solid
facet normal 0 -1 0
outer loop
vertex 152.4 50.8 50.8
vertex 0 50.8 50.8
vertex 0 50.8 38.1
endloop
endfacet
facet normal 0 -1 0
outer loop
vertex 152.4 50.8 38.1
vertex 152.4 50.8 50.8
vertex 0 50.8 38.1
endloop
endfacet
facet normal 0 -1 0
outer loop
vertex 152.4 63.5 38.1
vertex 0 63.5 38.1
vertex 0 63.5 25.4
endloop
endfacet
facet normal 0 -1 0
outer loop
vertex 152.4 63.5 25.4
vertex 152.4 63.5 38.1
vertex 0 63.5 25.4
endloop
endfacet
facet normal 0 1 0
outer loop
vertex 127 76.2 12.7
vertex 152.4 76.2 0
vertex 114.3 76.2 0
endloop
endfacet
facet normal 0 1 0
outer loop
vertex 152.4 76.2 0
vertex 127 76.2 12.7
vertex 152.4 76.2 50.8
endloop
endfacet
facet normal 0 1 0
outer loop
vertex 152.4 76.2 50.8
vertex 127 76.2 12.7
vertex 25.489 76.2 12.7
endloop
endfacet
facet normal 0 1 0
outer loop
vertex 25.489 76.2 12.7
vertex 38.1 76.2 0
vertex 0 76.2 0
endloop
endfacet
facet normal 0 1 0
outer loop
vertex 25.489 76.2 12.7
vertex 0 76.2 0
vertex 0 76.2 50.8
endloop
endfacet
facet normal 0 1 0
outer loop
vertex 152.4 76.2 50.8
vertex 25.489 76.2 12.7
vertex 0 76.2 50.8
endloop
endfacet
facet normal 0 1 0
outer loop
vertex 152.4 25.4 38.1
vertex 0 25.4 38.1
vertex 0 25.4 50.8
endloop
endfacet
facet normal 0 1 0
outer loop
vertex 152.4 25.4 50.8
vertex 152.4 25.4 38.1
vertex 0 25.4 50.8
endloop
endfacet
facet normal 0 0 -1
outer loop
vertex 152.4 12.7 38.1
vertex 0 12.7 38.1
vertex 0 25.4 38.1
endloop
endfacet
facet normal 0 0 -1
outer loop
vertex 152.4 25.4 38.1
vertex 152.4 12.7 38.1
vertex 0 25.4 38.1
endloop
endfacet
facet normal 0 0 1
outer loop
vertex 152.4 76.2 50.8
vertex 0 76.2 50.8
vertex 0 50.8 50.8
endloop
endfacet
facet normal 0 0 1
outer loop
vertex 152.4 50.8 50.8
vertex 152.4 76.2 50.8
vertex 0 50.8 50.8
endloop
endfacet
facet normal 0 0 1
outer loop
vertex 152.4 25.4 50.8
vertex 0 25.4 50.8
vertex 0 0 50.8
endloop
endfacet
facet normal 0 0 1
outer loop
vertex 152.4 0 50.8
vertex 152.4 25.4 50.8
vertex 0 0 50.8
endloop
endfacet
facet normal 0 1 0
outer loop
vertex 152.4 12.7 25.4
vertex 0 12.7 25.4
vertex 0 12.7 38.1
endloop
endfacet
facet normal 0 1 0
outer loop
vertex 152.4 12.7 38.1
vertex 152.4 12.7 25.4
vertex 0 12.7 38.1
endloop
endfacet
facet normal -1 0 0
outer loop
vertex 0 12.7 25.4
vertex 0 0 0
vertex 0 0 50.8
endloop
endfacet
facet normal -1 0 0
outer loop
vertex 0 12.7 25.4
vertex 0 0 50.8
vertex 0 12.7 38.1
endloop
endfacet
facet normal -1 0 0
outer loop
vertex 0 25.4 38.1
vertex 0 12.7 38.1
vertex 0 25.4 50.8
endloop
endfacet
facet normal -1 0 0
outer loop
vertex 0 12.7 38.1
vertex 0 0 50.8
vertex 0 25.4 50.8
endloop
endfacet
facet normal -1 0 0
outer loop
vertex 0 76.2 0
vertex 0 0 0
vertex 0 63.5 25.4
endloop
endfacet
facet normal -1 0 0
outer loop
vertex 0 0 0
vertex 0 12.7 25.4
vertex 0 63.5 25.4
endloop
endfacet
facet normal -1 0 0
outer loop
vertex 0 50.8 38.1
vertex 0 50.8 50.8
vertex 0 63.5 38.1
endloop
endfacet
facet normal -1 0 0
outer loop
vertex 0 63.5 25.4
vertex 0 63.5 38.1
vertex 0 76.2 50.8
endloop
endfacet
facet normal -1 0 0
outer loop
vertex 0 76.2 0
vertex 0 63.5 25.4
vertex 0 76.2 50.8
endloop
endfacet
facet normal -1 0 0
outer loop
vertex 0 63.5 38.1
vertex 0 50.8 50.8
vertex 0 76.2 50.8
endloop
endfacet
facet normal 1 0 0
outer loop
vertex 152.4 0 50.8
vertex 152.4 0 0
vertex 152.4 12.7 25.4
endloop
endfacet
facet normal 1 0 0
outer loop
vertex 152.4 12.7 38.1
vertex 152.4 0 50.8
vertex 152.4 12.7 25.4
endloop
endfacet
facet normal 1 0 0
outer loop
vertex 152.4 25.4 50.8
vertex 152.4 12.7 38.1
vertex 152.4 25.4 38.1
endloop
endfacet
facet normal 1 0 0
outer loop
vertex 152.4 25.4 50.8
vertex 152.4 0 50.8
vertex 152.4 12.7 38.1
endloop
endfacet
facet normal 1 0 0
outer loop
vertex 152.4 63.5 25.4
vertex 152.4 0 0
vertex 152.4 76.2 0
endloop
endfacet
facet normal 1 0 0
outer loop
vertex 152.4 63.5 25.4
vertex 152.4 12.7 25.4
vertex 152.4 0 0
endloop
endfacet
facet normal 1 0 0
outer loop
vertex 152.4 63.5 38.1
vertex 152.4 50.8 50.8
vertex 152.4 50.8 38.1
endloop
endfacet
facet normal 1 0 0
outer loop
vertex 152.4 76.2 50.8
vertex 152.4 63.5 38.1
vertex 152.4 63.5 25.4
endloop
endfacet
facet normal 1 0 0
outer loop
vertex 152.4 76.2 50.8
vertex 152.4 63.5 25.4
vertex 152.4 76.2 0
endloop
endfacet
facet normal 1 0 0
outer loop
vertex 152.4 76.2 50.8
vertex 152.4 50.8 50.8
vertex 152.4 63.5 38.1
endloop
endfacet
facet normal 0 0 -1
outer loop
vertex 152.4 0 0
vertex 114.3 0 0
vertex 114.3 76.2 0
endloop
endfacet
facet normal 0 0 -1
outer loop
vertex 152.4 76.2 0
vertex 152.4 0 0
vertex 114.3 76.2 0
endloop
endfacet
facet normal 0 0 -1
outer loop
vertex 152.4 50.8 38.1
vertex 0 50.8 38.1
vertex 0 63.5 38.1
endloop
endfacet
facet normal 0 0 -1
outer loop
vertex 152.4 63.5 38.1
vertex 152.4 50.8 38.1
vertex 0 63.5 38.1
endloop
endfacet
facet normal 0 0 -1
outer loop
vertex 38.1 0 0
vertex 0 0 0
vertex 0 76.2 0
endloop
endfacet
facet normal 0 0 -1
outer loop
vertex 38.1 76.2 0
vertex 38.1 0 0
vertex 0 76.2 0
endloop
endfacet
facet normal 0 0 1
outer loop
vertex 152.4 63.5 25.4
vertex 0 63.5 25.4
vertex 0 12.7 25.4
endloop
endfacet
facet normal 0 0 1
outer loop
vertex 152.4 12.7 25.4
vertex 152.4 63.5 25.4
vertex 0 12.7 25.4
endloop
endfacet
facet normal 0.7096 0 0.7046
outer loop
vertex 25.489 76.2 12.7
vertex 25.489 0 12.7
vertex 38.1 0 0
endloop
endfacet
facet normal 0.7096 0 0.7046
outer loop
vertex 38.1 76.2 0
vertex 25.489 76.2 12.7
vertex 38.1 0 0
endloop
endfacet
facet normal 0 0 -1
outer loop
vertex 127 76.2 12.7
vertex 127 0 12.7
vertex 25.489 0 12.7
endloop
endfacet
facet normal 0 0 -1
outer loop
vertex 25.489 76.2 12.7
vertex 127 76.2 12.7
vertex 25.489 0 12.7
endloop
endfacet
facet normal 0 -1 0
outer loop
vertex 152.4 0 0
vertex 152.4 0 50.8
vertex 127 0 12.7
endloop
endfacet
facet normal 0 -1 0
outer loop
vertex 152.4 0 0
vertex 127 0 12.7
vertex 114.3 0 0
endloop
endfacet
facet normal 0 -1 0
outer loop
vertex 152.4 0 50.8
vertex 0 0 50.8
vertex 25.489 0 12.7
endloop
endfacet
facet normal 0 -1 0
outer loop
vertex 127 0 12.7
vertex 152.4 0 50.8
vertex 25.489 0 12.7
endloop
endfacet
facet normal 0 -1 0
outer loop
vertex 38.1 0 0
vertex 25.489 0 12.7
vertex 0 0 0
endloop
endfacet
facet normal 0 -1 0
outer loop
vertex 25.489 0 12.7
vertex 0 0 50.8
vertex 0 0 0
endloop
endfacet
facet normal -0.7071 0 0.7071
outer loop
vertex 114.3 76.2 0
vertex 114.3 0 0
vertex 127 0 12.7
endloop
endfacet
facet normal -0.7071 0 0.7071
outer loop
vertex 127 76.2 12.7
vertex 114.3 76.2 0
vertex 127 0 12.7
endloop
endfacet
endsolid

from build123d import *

# Parameters (mm, degrees)
F1_DEPTH = 152.4
F3_DEPTH = 76.2


with BuildPart() as f1:
    # F0 (on Right) → F1 (new body)
    with BuildSketch(Plane.YZ):
        Polygon((25.4, 50.8), (0, 50.8), (0, 0), (76.2, 0), (76.2, 50.8), (50.8, 50.8), (50.8, 38.1), (63.5, 38.1), (63.5, 25.4), (12.7, 25.4), (12.7, 38.1), (25.4, 38.1), align=None)
    extrude(amount=F1_DEPTH)

    # F2 (on face) → F3 (cut, through all)
    with BuildSketch(Plane.XZ):
        Polygon((114.3, 0), (127, 12.7), (25.48896, 12.7), (38.1, 0), align=None)
    extrude(amount=-F3_DEPTH, mode=Mode.SUBTRACT)


solid = f1.part
